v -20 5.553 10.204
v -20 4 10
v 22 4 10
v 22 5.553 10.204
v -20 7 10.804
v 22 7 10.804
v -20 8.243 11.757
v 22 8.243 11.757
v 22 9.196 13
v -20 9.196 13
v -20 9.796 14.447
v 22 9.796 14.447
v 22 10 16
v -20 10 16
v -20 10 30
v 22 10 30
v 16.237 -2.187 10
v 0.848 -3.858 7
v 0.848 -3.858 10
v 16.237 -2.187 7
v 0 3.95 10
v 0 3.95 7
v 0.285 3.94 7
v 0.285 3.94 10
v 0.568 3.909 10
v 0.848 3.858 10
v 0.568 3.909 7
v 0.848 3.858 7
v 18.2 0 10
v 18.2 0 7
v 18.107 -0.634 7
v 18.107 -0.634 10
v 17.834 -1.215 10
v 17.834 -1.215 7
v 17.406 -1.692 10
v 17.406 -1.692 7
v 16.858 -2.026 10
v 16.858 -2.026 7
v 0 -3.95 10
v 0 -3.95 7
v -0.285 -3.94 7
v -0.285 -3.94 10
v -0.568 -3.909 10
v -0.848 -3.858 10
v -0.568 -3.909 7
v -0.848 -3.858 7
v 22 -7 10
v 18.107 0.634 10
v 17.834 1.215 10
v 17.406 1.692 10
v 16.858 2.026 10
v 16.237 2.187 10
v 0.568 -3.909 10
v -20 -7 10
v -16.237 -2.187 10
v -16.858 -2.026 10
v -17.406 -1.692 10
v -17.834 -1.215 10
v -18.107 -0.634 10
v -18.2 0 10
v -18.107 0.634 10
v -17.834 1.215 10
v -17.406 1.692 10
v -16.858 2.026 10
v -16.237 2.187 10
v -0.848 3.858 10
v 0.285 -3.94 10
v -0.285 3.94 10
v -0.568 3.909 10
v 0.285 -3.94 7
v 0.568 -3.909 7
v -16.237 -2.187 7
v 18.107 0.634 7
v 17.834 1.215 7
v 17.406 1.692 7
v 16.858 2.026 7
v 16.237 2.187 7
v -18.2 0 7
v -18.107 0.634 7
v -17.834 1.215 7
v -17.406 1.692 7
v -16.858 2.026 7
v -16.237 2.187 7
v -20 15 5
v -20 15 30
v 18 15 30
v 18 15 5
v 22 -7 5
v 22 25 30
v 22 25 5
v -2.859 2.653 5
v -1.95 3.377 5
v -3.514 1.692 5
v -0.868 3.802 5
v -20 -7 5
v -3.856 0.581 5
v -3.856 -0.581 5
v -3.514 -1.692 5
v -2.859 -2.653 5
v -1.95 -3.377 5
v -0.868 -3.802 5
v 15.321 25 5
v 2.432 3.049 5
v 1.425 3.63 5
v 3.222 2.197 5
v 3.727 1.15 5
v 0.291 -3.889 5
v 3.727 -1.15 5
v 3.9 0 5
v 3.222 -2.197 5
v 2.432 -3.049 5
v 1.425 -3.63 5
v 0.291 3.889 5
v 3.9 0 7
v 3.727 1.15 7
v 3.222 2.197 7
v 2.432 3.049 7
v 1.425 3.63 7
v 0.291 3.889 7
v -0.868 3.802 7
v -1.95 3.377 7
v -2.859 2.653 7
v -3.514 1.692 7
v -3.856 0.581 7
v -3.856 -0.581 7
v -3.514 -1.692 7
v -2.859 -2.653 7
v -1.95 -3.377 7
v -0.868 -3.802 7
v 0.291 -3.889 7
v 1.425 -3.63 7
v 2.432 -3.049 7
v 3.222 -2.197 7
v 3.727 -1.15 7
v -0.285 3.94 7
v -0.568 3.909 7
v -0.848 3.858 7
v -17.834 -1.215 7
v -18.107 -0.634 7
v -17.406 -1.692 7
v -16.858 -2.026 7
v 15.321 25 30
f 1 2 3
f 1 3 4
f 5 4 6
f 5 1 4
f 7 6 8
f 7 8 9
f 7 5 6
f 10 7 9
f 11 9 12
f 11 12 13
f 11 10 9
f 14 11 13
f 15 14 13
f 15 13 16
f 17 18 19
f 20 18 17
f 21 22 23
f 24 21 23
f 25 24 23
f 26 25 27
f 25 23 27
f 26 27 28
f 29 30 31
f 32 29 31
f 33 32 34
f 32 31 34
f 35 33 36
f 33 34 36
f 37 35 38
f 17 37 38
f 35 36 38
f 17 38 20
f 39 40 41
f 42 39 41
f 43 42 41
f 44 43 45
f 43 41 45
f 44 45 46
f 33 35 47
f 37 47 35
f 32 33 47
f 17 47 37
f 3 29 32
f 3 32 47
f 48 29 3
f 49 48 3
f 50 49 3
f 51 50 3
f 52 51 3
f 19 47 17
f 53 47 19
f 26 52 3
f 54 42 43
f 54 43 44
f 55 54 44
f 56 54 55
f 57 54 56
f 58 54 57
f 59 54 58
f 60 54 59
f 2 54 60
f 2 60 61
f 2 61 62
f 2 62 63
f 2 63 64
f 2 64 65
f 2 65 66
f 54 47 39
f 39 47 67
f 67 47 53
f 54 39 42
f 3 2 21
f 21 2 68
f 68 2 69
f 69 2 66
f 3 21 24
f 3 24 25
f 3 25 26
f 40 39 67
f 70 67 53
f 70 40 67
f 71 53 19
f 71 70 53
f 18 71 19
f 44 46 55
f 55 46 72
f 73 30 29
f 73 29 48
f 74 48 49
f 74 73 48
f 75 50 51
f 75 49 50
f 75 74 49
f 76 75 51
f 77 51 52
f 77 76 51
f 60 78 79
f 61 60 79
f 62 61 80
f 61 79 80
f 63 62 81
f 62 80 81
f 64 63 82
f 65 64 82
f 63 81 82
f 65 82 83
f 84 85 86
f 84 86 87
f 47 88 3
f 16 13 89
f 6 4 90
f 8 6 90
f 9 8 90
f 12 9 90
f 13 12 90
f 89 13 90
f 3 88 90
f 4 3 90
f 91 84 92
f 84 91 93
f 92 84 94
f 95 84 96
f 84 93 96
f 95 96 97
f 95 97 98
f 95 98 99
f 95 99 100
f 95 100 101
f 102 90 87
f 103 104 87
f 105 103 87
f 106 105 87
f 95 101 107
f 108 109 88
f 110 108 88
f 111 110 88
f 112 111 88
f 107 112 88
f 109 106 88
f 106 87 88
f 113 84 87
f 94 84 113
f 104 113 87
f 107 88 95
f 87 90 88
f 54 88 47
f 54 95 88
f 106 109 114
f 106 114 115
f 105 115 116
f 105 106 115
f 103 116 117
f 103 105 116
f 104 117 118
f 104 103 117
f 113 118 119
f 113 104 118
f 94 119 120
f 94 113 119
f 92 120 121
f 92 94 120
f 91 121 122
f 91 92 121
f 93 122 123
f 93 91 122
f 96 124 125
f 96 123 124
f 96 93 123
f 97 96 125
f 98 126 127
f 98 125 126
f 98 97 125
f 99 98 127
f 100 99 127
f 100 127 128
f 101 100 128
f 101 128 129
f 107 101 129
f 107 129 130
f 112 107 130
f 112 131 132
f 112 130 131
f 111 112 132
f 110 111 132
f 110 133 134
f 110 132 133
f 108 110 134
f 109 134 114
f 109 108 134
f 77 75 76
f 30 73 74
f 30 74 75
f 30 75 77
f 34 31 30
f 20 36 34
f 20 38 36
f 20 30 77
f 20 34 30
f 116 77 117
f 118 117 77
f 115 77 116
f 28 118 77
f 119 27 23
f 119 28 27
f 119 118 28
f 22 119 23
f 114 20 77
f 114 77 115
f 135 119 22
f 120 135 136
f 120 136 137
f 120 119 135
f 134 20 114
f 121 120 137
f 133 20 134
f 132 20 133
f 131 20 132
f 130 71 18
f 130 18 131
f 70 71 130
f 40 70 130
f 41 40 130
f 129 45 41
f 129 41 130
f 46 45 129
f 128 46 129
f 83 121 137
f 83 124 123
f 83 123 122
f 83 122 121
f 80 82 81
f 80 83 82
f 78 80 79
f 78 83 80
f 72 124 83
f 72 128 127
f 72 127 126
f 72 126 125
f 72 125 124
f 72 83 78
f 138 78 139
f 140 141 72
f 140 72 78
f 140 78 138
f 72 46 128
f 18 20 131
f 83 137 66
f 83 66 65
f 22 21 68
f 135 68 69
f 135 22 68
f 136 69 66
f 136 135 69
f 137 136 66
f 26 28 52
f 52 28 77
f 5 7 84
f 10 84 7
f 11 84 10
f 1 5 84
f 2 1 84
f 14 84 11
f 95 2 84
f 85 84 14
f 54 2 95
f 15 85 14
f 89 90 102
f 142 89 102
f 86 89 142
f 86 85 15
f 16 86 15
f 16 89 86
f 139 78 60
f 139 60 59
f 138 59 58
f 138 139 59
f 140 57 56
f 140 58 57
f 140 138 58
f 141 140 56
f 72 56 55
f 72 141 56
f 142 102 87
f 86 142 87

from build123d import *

# Parameters (mm, degrees)
PAD029_DEPTH                  = 20
PAD029_DEPTH_BACK             = 22
POCKET050_DEPTH               = 130.2017462661
POCKET050_MIRRORED022_2_DEPTH = 130.2017462661
PAD052_DEPTH                  = 25
SKETCH105_R                   = 3.9
POCKET053_DEPTH               = 0.001
POCKET053_DEPTH_BACK          = 30.001


with BuildPart() as part:
    # Sketch053 → Pad029 (new body, two sides)
    with BuildSketch(Plane.YZ) as pad029_sk:
        with BuildLine():
            Line((-7, 5), (-7, 10))
            Line((-7, 10), (4, 10))
            ThreePointArc((4, 10), (8.2426406871, 11.7573593129), (10, 16))
            Line((10, 16), (10, 30))
            Line((10, 30), (15, 30))
            Line((15, 30), (15, 5))
            Line((15, 5), (-7, 5))
        make_face()
    extrude(amount=-PAD029_DEPTH)
    extrude(pad029_sk.sketch, amount=PAD029_DEPTH_BACK)

    # Sketch100 → Pocket050 (cut, through all)
    with BuildSketch(Plane(origin=(0, 0, 7), x_dir=(-1, 0, 0), z_dir=(0, 0, -1))):
        with BuildLine():
            ThreePointArc((0, 3.95), (-2.7930717857, 2.7930717857), (-3.95, 0))
            Line((-3.95, 0), (18.2, 0))
            ThreePointArc((18.2, 0), (17.6374362231, 1.4692864307), (16.2374521678, 2.1871480215))
            Line((0, 3.95), (16.2374521678, 2.1871480215))
        make_face()
    pocket050 = extrude(amount=-POCKET050_DEPTH, mode=Mode.SUBTRACT)

    # Sketch100 Mirrored022 2 → Pocket050 Mirrored022 2 (cut, through all)
    with BuildSketch(Plane.XY.offset(7)):
        with BuildLine():
            ThreePointArc((0, 3.95), (-2.7930717857, 2.7930717857), (-3.95, 0))
            Line((-3.95, 0), (18.2, 0))
            ThreePointArc((18.2, 0), (17.6374362231, 1.4692864307), (16.2374521678, 2.1871480215))
            Line((0, 3.95), (16.2374521678, 2.1871480215))
        make_face()
    pocket050_mirrored022_2 = extrude(amount=POCKET050_MIRRORED022_2_DEPTH, mode=Mode.SUBTRACT)

    # Mirrored023: Pocket050, Pocket050 Mirrored022 2 across Sketch100 H_Axis
    add(pocket050.mirror(Plane(origin=(0, 0, 7), x_dir=(0, 0, -1), z_dir=(0, 1, 0))), mode=Mode.SUBTRACT)
    add(pocket050_mirrored022_2.mirror(Plane(origin=(0, 0, 7), x_dir=(0, 0, -1), z_dir=(0, 1, 0))), mode=Mode.SUBTRACT)

    # Sketch101 (on Face2 of MultiTransform004) → Pad052 (join)
    with BuildSketch(Plane.YX.offset(-5)):
        Polygon((15, 22), (25, 22), (25, 15.3205080757), (15, 18), align=None)
    extrude(amount=-PAD052_DEPTH)

    # Sketch105 → Pocket053 (cut, two sides)
    with BuildSketch(Plane.XY) as pocket053_sk:
        Circle(SKETCH105_R)
    extrude(amount=-POCKET053_DEPTH, mode=Mode.SUBTRACT)
    extrude(pocket053_sk.sketch, amount=POCKET053_DEPTH_BACK, mode=Mode.SUBTRACT)


solid = part.part
